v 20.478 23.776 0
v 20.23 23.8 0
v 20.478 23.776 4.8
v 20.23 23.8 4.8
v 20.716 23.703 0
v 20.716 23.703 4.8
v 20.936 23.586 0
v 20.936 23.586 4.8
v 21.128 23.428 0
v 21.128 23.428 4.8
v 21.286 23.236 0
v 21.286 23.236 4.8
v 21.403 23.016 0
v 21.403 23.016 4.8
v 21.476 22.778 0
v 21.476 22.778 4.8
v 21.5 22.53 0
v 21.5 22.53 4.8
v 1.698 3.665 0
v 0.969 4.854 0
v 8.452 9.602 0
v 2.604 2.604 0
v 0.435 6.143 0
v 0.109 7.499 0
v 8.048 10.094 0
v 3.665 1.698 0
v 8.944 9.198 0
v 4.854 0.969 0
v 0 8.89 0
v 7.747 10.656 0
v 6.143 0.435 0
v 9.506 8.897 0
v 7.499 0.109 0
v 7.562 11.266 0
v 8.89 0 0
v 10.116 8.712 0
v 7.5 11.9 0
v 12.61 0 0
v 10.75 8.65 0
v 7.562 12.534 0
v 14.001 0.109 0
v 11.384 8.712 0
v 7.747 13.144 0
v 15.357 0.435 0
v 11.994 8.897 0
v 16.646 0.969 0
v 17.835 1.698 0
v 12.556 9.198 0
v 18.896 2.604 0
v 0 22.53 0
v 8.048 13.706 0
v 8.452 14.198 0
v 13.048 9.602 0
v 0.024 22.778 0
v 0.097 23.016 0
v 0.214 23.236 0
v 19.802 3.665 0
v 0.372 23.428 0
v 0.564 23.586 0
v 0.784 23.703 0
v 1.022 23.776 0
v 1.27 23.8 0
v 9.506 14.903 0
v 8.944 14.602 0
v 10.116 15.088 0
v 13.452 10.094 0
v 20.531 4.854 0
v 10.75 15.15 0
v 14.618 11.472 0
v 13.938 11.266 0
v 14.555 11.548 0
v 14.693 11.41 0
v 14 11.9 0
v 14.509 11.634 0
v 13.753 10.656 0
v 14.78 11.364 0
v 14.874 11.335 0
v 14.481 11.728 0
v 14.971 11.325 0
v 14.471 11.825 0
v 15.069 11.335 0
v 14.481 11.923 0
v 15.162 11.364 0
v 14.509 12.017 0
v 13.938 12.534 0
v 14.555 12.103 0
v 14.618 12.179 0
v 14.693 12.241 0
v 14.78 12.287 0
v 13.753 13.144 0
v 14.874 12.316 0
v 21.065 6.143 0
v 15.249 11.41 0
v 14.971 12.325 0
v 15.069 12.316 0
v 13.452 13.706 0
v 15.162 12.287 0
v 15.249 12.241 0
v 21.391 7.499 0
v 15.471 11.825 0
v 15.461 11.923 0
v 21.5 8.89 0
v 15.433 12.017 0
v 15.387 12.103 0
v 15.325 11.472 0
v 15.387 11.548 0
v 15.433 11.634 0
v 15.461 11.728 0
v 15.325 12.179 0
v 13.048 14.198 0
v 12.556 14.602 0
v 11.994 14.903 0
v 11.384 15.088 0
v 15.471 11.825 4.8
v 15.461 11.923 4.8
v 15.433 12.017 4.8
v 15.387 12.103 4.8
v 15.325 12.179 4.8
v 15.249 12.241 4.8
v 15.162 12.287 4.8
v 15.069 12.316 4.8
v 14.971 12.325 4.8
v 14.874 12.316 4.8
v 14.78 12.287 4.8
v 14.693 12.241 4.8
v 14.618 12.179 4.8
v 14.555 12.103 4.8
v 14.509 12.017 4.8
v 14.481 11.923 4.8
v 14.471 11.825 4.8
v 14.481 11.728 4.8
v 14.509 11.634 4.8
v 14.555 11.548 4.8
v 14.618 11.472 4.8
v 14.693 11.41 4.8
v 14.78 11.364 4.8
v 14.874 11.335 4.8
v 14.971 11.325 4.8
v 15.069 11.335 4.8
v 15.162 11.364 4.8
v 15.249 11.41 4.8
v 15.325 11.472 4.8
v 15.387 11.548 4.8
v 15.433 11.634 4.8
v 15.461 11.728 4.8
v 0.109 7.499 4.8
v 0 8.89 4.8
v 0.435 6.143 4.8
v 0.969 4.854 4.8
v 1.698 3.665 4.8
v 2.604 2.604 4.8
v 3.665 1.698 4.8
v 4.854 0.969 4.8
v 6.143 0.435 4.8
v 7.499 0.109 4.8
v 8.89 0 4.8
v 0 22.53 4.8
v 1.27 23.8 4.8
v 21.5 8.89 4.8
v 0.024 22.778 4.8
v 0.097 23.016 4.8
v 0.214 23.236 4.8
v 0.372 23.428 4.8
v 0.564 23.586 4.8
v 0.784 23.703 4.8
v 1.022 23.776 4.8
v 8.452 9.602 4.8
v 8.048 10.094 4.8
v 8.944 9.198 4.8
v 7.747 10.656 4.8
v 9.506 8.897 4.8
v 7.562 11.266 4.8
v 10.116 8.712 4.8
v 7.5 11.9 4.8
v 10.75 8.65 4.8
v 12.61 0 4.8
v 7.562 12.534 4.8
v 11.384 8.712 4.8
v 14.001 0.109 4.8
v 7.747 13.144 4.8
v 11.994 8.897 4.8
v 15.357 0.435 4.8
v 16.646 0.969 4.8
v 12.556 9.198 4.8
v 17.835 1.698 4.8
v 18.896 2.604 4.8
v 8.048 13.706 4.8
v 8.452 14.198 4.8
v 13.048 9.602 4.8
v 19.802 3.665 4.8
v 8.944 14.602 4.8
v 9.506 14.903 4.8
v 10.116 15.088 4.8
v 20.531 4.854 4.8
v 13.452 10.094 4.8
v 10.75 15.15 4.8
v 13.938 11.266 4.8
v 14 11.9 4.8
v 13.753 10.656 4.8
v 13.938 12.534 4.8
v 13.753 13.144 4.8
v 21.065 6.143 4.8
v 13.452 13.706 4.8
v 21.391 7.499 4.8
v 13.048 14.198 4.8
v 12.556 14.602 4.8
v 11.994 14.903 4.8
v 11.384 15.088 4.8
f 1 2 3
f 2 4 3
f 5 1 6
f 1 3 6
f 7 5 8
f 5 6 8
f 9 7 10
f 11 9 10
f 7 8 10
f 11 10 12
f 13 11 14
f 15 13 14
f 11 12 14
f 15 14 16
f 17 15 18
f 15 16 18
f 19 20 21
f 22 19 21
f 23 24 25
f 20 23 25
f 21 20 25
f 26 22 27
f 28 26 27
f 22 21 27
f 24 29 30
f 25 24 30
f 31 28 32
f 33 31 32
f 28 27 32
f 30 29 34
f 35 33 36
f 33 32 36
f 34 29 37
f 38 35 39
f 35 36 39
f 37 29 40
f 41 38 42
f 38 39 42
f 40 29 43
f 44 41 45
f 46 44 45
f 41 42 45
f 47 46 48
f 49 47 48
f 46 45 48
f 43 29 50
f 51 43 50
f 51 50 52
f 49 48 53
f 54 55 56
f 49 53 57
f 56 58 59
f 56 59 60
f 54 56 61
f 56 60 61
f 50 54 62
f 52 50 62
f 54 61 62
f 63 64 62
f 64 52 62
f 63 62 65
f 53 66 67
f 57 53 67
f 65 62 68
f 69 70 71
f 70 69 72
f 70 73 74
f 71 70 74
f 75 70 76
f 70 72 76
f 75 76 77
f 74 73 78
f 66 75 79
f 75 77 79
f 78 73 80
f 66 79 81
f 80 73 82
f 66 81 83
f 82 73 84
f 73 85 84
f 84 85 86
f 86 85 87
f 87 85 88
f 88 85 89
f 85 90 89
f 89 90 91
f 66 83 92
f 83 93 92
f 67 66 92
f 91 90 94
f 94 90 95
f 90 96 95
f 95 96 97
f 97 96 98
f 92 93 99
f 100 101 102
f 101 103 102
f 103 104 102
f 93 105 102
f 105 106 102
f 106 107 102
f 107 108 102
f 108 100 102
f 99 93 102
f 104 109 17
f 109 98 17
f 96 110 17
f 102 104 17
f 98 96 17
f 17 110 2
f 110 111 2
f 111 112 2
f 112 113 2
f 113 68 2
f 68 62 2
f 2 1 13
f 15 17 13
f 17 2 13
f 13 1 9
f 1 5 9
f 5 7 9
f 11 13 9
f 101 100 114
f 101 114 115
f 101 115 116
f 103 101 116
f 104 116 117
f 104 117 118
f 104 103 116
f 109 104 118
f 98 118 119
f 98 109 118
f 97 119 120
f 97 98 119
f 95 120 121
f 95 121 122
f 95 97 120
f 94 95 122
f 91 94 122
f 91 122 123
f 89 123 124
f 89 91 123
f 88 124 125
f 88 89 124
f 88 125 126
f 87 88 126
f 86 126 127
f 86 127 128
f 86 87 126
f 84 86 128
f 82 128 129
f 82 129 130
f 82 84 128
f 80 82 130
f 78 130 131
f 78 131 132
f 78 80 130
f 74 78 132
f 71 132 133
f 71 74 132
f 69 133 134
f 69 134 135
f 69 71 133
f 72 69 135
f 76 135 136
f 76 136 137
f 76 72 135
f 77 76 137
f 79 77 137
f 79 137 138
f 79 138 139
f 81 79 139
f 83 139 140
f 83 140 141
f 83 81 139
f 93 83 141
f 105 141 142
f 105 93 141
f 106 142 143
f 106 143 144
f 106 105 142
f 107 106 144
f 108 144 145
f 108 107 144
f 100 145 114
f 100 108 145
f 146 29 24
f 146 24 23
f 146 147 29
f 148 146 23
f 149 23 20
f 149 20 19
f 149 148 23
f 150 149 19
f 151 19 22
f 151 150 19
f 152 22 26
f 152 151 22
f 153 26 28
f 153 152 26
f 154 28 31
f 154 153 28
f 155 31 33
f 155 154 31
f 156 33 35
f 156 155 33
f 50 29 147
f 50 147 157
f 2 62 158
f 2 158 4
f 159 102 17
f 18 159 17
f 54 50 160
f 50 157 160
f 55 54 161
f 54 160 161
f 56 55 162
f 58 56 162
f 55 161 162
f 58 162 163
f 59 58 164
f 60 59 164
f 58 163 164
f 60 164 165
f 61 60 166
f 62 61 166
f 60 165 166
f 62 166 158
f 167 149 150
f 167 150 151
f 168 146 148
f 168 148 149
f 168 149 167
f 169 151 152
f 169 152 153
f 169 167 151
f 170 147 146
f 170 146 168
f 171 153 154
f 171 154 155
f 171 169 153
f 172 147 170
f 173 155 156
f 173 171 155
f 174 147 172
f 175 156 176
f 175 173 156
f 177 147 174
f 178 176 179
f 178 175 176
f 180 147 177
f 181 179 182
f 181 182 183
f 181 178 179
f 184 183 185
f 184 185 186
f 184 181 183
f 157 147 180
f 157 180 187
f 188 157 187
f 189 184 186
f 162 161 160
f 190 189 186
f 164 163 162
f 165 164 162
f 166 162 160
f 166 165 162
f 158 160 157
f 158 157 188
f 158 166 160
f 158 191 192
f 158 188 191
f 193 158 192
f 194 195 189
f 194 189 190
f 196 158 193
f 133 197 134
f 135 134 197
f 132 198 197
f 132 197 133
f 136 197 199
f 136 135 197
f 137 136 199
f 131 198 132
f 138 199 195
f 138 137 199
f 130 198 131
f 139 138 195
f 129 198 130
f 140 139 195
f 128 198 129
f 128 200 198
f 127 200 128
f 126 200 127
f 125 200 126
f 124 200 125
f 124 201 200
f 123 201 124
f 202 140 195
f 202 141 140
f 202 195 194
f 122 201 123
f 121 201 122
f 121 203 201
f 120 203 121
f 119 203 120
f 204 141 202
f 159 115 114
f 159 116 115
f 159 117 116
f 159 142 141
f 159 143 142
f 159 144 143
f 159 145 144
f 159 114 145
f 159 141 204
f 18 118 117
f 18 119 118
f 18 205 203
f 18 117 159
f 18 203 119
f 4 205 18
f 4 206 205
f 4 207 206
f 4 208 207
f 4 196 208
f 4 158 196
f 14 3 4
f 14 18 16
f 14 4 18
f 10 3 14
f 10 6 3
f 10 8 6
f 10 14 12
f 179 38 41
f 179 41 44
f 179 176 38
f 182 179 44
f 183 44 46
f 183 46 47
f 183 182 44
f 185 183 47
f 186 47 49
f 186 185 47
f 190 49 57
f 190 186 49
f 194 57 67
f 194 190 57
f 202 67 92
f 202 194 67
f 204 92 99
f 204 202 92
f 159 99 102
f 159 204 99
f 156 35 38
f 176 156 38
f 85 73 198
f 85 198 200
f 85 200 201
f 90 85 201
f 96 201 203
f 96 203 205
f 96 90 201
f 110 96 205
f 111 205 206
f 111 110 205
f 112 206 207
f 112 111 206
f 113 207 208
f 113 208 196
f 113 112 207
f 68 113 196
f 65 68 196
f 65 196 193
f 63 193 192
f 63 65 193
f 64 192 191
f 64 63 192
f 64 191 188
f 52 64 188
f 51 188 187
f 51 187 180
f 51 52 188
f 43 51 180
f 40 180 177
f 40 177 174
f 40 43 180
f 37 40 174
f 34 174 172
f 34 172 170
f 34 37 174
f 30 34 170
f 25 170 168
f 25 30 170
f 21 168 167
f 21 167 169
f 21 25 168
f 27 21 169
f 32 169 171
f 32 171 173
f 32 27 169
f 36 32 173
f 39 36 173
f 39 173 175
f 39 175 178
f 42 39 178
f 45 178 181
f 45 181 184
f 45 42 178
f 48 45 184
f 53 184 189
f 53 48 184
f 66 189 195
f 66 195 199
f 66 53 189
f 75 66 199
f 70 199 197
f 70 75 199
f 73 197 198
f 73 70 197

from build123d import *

# Parameters (mm, degrees)
F0_W     = 21.5
F0_H     = 23.8
F0_R     = 0.5
F0_R_2   = 3.25
F1_DEPTH = 4.8
F2_R     = 8.89
F3_R     = 1.27


# Not quite as in the source:
# - a feature of the source that left no trace in its solid (it failed there, or was rolled back) is left out


with BuildPart() as f1:
    # F0 (on Top) → F1 (new body)
    with BuildSketch(Plane.XY):
        with Locations((10.75, 11.9)):
            Rectangle(F0_W, F0_H)
        with Locations((14.9710876867, 11.8254814297)):
            Circle(F0_R, mode=Mode.SUBTRACT)
        with Locations((10.75, 11.9)):
            Circle(F0_R_2, mode=Mode.SUBTRACT)
    extrude(amount=F1_DEPTH)

    # F2
    f2_edges = [f1.edges().sort_by_distance(p)[0] for p in [
        (21.5, 0, 2.4),
        (0, 0, 2.4),
    ]]
    fillet(f2_edges, radius=F2_R)

    # F3
    f3_edges = [f1.edges().sort_by_distance(p)[0] for p in [
        (21.5, 23.8, 2.4),
        (0, 23.8, 2.4),
    ]]
    fillet(f3_edges, radius=F3_R)


solid = f1.part
